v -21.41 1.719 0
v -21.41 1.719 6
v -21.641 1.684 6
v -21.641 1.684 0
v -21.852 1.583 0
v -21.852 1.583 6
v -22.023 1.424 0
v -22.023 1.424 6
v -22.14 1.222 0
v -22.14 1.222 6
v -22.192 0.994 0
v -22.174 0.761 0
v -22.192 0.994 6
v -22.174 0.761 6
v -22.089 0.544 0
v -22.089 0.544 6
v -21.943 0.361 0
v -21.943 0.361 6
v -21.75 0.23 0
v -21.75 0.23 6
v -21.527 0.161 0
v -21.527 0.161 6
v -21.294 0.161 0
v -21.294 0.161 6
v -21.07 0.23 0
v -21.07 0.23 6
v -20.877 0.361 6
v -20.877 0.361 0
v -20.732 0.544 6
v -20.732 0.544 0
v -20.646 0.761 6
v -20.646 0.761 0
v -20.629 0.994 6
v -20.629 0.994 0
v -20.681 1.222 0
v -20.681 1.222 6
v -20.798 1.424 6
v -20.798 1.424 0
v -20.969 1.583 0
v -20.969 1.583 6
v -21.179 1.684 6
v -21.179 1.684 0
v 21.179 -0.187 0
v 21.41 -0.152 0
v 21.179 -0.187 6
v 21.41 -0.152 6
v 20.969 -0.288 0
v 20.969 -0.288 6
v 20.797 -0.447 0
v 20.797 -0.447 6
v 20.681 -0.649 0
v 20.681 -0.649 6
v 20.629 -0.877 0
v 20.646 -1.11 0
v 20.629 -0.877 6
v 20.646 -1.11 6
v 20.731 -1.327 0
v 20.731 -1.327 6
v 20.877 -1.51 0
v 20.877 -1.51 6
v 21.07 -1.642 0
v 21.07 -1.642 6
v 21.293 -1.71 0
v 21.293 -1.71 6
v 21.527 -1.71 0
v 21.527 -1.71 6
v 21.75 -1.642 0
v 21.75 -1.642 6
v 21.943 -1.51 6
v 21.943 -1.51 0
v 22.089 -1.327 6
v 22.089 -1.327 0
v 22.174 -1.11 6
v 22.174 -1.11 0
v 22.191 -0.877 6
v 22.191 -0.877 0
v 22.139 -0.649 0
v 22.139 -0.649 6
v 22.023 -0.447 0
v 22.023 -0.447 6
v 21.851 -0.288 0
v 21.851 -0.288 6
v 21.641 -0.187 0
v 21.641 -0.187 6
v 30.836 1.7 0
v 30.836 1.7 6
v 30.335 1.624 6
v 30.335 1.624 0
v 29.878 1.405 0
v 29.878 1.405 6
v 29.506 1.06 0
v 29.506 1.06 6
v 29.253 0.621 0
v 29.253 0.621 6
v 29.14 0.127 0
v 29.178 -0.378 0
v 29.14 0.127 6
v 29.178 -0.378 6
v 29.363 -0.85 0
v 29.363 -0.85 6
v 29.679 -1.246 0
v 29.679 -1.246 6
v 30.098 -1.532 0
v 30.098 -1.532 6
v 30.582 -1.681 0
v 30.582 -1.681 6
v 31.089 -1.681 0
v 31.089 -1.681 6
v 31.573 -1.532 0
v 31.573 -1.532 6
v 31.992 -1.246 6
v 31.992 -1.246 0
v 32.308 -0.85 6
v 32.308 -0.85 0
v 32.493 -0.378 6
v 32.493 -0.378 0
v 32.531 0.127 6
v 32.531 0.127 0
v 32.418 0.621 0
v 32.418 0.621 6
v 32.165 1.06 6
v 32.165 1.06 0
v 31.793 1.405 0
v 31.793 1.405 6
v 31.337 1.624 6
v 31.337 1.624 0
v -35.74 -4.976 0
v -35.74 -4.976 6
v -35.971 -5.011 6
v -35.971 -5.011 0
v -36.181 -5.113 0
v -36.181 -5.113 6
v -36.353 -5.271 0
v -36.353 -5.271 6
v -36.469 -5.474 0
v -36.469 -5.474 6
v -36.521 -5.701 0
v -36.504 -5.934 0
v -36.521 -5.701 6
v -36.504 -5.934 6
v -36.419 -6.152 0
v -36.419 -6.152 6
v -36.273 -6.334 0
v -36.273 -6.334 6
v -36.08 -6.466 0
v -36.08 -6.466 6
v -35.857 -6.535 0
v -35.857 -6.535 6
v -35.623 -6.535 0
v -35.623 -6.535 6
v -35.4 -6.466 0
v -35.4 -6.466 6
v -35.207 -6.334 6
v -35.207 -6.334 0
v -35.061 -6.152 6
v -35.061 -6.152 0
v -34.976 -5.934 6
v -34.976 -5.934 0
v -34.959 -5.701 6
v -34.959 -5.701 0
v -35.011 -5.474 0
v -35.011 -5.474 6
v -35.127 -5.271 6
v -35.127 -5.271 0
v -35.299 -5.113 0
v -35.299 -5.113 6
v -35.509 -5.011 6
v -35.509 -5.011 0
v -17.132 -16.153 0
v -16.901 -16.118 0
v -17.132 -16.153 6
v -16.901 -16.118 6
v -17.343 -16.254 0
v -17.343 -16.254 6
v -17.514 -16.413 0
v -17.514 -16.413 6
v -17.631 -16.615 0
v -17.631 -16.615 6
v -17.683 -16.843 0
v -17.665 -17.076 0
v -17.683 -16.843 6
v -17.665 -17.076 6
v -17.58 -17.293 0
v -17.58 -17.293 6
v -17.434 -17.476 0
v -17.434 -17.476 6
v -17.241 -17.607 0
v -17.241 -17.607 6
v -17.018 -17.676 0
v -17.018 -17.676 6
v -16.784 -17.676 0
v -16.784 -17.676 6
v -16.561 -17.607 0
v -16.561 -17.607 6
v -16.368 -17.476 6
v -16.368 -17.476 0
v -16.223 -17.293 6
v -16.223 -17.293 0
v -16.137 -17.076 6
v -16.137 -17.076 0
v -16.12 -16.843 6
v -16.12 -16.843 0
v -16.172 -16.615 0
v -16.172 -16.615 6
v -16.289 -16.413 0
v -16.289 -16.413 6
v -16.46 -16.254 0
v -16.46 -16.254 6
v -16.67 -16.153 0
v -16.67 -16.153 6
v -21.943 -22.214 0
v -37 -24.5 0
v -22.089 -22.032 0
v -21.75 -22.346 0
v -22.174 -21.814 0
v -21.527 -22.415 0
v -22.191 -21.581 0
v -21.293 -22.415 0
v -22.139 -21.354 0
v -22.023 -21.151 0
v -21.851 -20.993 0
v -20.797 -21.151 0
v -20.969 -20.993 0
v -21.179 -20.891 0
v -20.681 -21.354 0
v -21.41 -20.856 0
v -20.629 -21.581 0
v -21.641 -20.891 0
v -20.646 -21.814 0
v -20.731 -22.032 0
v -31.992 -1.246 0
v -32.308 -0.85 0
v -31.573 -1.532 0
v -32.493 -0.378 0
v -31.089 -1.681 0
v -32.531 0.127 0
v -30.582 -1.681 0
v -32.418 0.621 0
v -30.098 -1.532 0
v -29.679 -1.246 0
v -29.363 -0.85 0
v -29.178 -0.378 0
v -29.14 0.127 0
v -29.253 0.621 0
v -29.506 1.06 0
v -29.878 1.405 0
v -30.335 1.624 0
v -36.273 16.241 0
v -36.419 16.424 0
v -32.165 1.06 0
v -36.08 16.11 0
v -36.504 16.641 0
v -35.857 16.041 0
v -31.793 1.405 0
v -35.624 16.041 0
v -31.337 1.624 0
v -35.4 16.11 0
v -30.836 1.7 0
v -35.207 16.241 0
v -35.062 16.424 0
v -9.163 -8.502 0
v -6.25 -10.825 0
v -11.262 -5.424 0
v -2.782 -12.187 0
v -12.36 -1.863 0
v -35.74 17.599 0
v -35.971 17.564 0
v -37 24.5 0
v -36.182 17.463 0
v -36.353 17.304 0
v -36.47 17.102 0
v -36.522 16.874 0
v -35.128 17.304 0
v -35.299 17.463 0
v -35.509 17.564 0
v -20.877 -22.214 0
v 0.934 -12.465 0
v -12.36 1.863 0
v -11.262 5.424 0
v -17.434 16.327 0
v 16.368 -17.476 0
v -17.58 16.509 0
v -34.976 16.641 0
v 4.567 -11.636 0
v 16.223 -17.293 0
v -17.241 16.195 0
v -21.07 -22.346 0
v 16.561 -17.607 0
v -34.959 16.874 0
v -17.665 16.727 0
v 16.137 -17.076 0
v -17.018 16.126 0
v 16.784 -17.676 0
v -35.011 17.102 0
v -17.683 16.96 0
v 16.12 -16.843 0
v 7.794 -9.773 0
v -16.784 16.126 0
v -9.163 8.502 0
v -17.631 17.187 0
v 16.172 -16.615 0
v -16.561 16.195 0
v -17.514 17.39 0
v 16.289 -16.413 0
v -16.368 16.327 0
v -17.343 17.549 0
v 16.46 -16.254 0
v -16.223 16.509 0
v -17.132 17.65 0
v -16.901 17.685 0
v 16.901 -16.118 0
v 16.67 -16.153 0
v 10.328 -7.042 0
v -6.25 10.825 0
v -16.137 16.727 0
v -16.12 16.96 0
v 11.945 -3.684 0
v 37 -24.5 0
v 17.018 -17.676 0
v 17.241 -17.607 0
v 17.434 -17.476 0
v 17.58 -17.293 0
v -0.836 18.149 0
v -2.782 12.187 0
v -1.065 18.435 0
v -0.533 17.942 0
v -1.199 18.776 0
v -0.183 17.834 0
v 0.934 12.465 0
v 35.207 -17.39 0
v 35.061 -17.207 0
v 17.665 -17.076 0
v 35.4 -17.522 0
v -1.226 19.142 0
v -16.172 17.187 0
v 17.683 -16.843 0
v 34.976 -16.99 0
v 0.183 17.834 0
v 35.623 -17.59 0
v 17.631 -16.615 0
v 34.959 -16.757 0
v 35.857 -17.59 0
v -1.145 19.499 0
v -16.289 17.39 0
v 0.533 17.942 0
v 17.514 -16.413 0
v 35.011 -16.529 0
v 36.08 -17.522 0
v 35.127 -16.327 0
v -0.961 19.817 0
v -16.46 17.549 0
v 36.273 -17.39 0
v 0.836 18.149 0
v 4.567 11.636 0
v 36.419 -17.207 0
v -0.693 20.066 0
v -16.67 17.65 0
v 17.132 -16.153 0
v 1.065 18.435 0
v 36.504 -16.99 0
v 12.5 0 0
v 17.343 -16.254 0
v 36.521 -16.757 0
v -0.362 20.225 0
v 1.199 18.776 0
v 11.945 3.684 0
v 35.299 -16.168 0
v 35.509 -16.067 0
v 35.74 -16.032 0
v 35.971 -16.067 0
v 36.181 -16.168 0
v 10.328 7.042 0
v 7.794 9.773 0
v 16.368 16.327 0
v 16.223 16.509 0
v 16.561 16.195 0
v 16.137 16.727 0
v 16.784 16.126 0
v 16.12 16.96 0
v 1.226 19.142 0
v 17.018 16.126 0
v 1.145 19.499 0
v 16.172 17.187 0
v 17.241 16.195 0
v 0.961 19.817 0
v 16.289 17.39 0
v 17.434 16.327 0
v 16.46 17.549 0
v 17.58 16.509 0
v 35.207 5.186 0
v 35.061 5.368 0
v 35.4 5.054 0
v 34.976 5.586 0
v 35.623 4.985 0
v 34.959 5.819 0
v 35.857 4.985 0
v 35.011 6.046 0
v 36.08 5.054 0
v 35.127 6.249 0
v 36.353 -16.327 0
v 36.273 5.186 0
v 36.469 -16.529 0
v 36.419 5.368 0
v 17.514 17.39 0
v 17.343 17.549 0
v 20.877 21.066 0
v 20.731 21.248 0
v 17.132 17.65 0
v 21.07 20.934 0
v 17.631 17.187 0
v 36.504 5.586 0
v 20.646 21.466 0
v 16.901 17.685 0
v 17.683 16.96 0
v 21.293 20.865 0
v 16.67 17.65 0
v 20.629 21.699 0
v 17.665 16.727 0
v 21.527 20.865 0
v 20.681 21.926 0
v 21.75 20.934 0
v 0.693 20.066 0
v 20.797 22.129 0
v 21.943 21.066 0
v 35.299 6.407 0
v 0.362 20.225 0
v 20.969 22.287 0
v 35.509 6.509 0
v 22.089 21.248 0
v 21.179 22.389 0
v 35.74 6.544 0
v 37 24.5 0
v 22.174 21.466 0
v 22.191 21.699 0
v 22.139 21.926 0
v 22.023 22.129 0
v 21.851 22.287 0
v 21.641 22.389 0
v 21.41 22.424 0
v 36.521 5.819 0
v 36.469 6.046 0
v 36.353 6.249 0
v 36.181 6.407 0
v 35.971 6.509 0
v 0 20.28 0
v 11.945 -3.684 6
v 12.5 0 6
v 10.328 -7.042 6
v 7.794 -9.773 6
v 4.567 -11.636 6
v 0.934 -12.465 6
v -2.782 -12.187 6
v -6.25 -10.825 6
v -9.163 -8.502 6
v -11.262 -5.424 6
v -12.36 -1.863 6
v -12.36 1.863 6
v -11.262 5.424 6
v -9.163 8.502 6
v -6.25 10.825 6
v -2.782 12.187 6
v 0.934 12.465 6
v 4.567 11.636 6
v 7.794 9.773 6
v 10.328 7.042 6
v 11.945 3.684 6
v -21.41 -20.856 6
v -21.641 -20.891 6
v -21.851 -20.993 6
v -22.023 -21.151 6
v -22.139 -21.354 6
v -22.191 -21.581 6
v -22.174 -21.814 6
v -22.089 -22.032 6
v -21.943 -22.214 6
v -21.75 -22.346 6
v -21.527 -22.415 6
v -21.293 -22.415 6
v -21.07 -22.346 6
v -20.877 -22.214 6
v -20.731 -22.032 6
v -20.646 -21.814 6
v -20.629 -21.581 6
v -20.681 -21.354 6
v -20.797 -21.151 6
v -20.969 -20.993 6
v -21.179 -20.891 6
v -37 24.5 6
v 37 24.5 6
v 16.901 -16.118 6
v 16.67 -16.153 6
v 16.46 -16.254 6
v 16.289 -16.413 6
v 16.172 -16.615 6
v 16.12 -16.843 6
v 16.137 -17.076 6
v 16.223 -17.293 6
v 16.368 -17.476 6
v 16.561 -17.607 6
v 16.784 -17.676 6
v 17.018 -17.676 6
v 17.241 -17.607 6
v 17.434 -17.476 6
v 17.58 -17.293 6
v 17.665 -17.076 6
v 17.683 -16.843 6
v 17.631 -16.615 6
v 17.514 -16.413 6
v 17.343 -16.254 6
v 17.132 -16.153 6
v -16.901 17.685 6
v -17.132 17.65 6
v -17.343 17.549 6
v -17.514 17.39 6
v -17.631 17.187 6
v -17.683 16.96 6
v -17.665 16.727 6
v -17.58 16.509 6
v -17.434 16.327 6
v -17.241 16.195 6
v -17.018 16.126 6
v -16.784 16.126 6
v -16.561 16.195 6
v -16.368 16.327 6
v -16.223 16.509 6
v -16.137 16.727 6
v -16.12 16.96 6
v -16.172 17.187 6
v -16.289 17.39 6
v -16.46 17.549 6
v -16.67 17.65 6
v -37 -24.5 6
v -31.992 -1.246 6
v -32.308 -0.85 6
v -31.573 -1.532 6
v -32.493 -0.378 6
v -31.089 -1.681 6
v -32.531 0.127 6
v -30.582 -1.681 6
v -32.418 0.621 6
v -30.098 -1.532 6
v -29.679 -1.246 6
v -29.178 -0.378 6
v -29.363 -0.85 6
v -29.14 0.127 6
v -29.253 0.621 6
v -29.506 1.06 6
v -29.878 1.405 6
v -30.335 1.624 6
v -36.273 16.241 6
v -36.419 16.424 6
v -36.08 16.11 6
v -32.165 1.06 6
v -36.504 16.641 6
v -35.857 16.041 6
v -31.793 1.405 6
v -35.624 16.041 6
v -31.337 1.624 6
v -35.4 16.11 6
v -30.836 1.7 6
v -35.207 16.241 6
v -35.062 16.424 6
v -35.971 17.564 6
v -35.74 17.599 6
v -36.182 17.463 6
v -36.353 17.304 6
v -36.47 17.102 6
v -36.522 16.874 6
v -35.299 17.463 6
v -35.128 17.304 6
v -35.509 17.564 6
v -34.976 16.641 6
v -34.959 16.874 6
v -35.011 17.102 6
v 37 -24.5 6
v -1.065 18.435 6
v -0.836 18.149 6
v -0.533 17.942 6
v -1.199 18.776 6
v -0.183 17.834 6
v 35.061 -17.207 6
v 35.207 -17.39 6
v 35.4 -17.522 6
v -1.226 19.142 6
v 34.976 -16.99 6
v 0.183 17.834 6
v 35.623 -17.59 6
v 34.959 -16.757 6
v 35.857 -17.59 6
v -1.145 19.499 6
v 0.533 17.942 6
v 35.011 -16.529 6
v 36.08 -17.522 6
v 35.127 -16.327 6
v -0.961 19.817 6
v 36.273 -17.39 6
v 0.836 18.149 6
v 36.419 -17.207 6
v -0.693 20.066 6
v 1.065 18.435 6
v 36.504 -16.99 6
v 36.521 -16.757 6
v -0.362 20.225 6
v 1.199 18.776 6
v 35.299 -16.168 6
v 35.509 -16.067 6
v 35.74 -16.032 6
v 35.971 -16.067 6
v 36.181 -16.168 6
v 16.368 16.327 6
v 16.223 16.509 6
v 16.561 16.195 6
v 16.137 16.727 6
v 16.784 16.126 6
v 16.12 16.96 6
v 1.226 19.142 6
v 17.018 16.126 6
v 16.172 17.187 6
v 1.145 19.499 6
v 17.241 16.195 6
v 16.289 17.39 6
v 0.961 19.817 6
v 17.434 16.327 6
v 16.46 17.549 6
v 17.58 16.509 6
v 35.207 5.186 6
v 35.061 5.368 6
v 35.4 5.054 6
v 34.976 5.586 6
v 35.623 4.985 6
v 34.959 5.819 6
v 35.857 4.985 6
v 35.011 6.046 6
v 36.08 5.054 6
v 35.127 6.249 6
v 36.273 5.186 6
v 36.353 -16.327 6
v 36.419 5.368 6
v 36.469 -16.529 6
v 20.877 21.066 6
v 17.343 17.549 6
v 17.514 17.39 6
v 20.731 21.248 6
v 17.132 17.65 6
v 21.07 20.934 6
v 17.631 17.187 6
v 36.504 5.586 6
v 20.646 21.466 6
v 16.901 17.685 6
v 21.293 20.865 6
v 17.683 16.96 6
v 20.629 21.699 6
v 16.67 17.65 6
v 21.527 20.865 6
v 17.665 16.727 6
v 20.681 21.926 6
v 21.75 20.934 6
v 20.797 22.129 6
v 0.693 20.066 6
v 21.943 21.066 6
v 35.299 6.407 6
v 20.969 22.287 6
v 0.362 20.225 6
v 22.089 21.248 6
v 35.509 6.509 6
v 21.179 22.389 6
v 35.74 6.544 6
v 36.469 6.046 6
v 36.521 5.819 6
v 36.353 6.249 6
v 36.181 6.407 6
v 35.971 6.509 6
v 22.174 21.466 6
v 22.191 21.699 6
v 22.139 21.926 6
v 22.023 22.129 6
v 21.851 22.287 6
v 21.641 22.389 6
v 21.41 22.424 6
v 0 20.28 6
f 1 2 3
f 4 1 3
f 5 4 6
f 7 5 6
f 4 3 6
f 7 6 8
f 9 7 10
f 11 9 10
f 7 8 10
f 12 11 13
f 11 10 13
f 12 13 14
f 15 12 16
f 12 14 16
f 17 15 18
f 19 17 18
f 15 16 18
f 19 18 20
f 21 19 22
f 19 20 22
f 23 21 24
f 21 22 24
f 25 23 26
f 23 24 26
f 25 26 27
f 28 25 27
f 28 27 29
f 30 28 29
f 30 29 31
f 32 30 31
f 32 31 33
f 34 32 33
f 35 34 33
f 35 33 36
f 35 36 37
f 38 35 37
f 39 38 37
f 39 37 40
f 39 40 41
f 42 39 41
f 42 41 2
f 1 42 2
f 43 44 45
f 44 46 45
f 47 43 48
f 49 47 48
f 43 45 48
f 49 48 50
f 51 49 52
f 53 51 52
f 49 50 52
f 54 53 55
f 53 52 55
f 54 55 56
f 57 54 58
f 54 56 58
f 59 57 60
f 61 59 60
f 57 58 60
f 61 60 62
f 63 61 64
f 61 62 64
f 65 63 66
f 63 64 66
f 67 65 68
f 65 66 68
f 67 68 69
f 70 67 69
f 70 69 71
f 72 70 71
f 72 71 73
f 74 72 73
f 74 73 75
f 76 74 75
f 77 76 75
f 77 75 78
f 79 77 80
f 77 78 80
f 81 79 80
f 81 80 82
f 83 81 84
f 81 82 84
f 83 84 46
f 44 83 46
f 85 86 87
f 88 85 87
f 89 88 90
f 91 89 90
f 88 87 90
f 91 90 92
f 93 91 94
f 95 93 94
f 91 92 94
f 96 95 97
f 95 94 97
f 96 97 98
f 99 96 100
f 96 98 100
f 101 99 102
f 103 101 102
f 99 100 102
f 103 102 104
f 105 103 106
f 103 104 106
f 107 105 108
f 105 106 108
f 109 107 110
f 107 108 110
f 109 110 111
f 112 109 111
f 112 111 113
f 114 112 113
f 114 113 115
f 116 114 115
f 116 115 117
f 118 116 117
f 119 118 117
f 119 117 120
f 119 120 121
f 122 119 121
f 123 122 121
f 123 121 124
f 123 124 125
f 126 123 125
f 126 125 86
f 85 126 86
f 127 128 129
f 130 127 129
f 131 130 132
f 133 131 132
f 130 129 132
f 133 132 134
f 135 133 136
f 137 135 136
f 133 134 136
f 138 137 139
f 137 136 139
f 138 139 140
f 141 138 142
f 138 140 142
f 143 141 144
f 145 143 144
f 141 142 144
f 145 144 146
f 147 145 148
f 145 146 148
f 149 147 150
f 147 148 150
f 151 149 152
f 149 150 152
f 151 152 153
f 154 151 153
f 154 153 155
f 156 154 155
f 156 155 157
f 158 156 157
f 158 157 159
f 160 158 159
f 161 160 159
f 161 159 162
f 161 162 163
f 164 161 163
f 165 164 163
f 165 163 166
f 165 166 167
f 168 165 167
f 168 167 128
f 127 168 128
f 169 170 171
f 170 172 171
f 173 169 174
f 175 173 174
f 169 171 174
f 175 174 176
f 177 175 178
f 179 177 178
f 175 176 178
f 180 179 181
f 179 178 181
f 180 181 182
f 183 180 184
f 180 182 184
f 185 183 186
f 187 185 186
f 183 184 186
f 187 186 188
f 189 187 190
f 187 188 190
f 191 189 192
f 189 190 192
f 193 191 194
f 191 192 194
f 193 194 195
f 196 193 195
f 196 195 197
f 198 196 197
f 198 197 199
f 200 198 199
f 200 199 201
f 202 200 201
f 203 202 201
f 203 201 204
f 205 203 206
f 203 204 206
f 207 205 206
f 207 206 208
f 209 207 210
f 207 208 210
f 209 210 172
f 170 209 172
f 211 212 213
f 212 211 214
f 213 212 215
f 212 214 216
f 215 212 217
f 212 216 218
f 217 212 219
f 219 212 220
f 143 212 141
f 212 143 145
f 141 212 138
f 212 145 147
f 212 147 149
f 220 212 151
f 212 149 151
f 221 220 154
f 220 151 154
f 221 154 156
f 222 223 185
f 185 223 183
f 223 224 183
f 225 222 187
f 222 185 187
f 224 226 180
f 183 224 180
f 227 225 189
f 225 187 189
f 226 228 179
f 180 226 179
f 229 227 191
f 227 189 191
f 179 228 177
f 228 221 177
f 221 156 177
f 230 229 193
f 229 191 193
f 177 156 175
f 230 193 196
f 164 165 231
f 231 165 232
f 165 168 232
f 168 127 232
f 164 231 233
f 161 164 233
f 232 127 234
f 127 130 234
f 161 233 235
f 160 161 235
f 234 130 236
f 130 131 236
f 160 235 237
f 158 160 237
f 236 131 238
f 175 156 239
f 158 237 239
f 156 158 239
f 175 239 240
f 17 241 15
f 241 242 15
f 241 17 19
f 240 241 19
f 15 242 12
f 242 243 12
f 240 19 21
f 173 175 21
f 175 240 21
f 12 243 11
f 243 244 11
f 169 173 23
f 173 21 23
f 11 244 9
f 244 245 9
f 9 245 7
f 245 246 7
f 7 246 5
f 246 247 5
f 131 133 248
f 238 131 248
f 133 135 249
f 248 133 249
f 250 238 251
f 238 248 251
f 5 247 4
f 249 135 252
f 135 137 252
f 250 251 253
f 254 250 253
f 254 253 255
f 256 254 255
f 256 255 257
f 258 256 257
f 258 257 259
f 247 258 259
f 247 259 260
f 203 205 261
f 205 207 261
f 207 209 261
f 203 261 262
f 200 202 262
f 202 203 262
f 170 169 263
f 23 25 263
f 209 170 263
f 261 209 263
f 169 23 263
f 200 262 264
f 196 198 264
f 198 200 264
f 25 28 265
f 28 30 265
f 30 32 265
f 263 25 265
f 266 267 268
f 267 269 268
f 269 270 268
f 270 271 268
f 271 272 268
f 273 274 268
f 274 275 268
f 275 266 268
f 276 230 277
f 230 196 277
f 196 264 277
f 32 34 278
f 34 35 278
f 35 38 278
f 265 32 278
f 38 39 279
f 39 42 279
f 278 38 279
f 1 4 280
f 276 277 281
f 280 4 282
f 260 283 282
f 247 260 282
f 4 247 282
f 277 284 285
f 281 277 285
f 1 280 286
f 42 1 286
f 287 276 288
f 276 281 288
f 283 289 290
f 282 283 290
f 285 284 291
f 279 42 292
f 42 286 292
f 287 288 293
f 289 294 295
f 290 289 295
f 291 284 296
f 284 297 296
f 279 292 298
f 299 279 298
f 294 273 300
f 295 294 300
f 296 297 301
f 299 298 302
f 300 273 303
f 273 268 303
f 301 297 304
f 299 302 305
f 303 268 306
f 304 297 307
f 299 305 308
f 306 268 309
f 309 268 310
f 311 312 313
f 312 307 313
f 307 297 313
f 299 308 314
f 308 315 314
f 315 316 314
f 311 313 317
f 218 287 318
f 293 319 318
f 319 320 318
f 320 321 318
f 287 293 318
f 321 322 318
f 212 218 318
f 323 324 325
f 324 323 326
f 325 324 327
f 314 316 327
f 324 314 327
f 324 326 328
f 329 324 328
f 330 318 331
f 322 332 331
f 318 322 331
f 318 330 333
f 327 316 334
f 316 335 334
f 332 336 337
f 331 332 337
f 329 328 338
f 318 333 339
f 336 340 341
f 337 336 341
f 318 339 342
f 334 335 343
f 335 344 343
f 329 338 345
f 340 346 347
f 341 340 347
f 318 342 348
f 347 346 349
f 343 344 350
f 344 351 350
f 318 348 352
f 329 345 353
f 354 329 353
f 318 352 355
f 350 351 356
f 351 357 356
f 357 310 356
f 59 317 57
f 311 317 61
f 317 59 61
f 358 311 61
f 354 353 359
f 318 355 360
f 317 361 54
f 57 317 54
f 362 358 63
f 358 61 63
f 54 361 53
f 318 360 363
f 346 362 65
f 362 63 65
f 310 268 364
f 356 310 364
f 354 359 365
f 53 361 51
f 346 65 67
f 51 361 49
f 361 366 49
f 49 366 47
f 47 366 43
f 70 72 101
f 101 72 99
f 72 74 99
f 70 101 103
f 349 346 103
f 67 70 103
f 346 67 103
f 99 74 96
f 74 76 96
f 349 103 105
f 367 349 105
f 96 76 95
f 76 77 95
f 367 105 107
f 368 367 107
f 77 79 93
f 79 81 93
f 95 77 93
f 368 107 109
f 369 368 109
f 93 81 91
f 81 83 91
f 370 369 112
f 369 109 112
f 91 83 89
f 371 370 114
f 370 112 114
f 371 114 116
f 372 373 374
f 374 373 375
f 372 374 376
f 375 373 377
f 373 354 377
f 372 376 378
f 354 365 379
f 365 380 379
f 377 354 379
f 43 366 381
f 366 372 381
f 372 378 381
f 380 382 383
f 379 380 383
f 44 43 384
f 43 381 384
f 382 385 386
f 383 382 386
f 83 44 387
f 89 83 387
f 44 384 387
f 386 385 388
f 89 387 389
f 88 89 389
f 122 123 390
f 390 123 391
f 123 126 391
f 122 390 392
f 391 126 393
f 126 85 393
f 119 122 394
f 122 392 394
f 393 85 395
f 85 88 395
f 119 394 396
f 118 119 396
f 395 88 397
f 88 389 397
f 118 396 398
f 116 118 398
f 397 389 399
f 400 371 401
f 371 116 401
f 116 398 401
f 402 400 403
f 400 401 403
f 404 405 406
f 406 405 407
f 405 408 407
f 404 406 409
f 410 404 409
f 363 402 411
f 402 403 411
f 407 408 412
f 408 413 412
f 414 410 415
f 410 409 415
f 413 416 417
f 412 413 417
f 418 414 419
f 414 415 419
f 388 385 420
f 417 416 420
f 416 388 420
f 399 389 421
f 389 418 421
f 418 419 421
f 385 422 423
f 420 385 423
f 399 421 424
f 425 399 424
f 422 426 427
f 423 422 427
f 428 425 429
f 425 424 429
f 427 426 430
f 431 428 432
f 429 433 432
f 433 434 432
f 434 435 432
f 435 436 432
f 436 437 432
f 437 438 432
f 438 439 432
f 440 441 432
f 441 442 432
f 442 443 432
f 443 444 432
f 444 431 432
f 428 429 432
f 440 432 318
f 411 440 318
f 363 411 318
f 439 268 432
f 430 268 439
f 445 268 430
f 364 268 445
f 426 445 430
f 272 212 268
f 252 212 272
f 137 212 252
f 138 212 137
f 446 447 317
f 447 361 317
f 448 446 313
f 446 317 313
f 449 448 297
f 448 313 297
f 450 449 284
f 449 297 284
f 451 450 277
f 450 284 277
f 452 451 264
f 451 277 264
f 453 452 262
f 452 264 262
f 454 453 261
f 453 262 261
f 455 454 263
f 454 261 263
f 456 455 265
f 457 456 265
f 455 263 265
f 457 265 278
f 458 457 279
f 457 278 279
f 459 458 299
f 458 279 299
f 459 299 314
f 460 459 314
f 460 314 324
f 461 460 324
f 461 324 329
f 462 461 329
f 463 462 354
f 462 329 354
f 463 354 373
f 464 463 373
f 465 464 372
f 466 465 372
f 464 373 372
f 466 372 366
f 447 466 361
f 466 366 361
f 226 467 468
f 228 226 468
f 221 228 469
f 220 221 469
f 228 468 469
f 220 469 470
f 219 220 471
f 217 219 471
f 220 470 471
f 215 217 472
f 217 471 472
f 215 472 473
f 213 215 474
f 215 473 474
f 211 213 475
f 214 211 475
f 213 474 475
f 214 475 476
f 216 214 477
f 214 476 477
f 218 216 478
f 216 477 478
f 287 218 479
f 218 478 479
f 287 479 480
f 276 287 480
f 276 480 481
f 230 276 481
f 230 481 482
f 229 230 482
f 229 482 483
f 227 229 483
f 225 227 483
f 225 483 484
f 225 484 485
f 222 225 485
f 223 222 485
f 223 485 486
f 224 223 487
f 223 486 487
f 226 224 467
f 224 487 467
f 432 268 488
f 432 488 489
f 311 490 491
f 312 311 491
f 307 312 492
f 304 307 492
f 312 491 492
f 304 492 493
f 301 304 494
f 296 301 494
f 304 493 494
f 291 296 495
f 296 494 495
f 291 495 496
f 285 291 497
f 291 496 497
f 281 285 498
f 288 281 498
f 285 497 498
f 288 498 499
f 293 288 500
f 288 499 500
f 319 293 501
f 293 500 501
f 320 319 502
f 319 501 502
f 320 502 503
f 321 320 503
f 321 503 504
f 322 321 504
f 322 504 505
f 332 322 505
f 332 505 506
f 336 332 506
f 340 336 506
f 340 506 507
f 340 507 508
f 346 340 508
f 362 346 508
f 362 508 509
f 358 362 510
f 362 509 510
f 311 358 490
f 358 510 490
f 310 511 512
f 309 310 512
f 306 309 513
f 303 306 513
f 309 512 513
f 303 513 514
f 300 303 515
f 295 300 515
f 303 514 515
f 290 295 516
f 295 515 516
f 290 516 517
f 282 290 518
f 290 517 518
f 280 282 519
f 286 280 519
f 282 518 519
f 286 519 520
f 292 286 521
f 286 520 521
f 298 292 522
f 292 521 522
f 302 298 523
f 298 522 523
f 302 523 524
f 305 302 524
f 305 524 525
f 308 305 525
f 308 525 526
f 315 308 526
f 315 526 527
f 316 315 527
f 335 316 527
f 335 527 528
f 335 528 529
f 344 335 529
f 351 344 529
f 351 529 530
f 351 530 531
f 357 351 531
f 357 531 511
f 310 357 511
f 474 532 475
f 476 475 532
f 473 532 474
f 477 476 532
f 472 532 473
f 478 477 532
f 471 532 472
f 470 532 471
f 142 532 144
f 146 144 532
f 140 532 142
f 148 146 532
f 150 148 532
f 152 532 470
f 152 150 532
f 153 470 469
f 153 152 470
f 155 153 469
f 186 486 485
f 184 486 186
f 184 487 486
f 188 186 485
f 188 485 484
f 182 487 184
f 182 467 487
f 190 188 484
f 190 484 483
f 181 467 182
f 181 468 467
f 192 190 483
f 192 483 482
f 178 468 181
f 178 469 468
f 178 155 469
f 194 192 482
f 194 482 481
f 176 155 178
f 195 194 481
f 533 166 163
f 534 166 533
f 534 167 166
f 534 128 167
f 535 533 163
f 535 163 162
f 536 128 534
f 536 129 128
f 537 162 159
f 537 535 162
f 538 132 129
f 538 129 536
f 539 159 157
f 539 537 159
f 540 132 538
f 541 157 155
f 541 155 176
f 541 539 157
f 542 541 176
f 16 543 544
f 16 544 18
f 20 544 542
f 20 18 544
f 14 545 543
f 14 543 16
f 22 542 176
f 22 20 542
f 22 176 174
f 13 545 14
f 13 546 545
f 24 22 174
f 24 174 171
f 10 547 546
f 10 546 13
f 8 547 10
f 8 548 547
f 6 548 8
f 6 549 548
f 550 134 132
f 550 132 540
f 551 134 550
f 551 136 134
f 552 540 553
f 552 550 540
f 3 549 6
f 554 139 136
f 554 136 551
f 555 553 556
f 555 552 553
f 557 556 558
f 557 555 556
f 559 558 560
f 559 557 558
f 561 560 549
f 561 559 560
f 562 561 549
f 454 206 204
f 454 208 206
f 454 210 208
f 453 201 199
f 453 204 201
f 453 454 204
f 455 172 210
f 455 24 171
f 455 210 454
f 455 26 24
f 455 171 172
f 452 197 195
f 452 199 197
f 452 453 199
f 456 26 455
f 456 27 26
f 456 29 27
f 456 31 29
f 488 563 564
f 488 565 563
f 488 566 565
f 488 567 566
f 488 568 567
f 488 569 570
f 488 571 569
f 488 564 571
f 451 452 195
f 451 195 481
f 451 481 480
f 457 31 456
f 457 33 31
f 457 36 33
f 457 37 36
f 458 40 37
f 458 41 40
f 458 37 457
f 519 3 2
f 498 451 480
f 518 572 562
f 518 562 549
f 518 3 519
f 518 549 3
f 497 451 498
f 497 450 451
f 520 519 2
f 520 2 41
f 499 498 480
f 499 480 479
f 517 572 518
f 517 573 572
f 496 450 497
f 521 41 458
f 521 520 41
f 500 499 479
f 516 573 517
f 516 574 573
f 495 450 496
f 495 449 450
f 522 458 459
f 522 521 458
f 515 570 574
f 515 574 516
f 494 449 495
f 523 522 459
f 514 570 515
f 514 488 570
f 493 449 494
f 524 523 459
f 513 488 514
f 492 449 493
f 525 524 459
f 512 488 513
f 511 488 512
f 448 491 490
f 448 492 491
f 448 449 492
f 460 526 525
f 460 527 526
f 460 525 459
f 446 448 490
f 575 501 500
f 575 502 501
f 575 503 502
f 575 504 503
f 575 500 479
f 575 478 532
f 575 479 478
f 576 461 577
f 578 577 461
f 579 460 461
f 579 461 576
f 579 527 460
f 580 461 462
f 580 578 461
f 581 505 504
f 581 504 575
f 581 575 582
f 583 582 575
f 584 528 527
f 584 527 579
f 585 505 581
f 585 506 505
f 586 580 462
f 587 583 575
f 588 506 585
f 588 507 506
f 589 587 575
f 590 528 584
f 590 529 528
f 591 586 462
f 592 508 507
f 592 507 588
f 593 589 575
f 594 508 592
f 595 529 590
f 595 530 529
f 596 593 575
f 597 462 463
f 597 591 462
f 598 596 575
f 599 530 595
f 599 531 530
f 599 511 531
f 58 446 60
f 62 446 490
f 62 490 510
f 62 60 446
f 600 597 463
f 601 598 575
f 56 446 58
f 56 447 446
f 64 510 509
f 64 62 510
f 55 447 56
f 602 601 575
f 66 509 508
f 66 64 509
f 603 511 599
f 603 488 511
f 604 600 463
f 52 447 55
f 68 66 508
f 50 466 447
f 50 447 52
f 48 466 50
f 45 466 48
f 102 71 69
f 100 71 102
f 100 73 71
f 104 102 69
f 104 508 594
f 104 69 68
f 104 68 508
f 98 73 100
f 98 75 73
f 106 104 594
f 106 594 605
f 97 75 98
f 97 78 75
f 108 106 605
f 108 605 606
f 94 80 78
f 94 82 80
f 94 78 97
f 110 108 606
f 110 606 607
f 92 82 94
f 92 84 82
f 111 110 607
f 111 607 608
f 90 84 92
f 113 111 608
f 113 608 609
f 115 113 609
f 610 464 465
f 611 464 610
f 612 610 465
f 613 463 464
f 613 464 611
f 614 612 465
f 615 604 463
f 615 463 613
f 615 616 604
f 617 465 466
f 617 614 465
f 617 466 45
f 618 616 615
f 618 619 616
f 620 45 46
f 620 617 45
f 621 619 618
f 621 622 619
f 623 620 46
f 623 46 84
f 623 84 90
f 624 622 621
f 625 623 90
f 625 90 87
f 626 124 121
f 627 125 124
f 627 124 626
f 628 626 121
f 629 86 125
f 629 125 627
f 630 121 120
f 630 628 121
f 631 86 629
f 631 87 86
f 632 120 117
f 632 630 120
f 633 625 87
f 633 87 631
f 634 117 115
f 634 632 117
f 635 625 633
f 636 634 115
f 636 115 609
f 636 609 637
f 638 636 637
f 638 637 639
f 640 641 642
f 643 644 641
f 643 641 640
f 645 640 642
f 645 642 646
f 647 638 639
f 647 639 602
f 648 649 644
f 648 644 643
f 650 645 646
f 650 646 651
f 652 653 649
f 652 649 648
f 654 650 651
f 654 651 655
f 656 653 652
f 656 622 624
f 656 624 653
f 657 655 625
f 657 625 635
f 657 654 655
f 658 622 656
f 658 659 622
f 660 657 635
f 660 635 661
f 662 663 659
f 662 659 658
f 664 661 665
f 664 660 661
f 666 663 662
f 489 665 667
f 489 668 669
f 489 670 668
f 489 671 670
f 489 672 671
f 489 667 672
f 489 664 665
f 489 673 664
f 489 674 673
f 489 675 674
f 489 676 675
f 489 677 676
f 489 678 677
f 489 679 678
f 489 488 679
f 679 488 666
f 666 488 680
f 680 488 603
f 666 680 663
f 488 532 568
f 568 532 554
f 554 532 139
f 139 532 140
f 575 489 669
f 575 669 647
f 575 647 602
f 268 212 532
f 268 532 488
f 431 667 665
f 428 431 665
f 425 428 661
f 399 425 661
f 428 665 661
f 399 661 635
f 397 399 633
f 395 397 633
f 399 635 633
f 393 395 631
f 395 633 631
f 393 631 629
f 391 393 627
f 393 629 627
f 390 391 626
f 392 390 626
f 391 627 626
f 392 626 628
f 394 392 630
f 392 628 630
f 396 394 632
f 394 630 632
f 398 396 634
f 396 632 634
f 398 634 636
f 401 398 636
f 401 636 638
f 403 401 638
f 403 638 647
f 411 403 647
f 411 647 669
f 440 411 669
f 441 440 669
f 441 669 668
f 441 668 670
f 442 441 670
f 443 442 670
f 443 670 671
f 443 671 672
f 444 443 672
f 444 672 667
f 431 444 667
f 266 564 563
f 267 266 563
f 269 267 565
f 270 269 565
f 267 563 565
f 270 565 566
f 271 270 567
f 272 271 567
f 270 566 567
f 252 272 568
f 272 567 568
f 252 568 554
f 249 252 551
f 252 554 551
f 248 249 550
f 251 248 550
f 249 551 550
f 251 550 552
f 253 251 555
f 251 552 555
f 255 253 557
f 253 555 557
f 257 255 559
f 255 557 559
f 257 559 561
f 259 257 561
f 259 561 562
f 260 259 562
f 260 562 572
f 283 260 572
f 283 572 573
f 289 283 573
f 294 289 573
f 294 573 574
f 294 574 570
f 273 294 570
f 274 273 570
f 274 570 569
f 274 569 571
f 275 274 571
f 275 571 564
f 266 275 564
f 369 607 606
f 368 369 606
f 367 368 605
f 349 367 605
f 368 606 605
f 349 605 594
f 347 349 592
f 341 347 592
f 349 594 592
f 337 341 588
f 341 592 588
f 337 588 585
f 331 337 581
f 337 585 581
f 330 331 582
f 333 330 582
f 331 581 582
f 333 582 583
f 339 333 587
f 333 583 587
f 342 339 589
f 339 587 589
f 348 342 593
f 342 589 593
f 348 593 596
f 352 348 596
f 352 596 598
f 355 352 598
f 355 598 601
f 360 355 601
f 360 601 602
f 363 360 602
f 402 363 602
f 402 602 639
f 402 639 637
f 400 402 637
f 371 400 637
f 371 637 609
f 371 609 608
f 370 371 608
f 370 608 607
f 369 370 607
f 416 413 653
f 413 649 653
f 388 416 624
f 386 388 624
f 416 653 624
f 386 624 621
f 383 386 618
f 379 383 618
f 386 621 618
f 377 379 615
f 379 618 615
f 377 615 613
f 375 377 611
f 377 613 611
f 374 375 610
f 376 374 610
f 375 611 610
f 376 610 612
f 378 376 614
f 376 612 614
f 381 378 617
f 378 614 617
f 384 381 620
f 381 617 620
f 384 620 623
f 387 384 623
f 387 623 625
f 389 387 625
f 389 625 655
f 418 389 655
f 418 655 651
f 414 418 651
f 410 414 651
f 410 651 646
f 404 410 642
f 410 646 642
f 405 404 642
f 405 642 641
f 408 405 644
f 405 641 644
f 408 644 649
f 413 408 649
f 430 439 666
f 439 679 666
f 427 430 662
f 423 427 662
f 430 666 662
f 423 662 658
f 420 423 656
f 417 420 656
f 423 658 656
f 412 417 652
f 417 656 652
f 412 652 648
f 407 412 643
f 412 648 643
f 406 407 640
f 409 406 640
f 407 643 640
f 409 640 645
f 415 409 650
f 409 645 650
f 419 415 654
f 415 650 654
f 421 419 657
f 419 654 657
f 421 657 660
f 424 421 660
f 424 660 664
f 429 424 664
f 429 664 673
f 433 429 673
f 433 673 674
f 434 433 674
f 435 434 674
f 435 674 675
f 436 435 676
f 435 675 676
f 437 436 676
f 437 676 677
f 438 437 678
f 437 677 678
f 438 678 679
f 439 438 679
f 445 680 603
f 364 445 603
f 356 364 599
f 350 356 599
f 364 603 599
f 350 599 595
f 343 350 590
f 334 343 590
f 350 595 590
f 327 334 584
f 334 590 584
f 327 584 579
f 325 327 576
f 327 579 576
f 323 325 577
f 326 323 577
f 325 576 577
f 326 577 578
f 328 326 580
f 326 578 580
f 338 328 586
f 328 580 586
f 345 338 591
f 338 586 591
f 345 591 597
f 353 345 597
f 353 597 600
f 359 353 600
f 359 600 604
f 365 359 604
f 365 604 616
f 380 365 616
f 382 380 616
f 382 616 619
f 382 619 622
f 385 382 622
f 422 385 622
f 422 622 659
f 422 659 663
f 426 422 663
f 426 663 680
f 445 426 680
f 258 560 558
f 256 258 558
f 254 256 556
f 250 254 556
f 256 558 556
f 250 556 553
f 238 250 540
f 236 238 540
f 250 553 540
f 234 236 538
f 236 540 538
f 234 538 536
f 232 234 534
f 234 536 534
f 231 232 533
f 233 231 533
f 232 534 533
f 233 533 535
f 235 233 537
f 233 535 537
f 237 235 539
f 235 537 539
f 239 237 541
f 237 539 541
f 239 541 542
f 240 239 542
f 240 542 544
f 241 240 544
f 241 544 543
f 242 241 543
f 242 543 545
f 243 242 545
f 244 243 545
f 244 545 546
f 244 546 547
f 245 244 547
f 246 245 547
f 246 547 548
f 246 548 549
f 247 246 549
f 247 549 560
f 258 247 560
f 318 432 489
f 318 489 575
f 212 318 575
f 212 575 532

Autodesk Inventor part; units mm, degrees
ref_plane "YZ Plane" through (0, 0, 0) normal (1, 0, 0) x (0, 1, 0)
ref_plane "XZ Plane" through (0, 0, 0) normal (0, 1, 0) x (-1, 0, 0)
ref_plane "XY Plane" through (0, 0, 0) normal (0, 0, 1) x (1, 0, 0)
sketch "Sketch1" plane through (0, 0, 0) normal (0, 0, 1) x (1, 0, 0)
  line L0 (37, -24.5) -> (-37, -24.5)
  line L1 (-37, -24.5) -> (-37, 24.5)
  line L2 (-37, 24.5) -> (37, 24.5)
  line L3 (37, 24.5) -> (37, -24.5)
  line L4 (37, -24.5) -> (-37, 24.5) construction
  line L5 (-37, -24.5) -> (37, 24.5) construction
  circle A0 centre (0, 0) radius 12.5
  line L6 (-19.05, 19.05) -> (19.05, 19.05)
  line L7 (19.05, 19.05) -> (19.05, -19.05)
  line L8 (19.05, -19.05) -> (-19.05, -19.05)
  line L9 (-19.05, -19.05) -> (-19.05, 19.05)
  line L10 (-19.05, 19.05) -> (19.05, -19.05) construction
  line L11 (19.05, 19.05) -> (-19.05, -19.05) construction
  line L12 (19.05, 19.05) -> (16.9012, 19.05)
  line L13 (16.9012, 19.05) -> (16.9012, 16.9012)
  line L14 (16.9012, 16.9012) -> (19.05, 16.9012)
  line L15 (19.05, 16.9012) -> (19.05, 19.05)
  line L16 (0, 19.05) -> (0, -19.05)
  line L17 (-19.05, 0) -> (19.05, 0)
  line L18 (-16.9012, 19.05) -> (-16.9012, 16.9012)
  line L19 (-16.9012, 16.9012) -> (-19.05, 16.9012)
  line L20 (19.05, 0) -> (-19.05, 0)
  line L21 (16.9012, -19.05) -> (16.9012, -16.9012)
  line L22 (16.9012, -16.9012) -> (19.05, -16.9012)
  line L23 (-16.9012, -16.9012) -> (-19.05, -16.9012)
  line L24 (-16.9012, -19.05) -> (-16.9012, -16.9012)
  line L25 (19.05, 0) -> (30.8356, 0)
  line L26 (-19.05, 0) -> (-30.8356, 0)
  circle A1 centre (-16.9012, 16.9012) radius 2
  circle A2 centre (16.9012, 16.9012) radius 2
  circle A3 centre (16.9012, -16.9012) radius 2
  circle A4 centre (-16.9012, -16.9012) radius 2
  circle A5 centre (-30.8356, 0) radius 2.85
  circle A6 centre (30.8356, 0) radius 2.85
  line L27 (-30.8356, 14.9012) -> (-30.8356, 2.85)
  line L28 (-38.1003, 8.8756) -> (-19.0503, 8.8756)
  line L29 (-22.8548, 8.8756) -> (-20.3098, 8.8756)
  line L30 (-21.4103, 8.8756) -> (-21.4103, 0.9356)
  line L31 (-38.1719, 10.7443) -> (-35.8119, 10.7443)
  line L32 (-35.7403, 8.8756) -> (-35.7403, 16.8156)
  line L33 (-38.1719, 16.29) -> (-38.1719, 13.7)
  line L34 (-35.7403, 14.2256) -> (-19.0503, 14.2256)
  line L35 (-19.0503, 14.2256) -> (-19.0503, 8.8756)
  line L36 (-25.2148, 0.9356) -> (-25.2148, 3.5256)
  line L37 (-21.4103, 3.5256) -> (-38.1003, 3.5256)
  line L38 (-38.1003, 14.2256) -> (-35.7403, 14.2256)
  line L39 (-21.4103, 3.5256) -> (-19.0503, 3.5256)
  line L40 (-19.0503, 3.5256) -> (-19.0503, 8.8756)
  line L41 (-35.8119, 14.2256) -> (-35.8119, 19.0506)
  line L42 (-38.1003, 19.0506) -> (-33.3803, 19.0506)
  line L43 (-33.3803, 19.0506) -> (-33.3803, 14.2256)
  line L44 (-19.0503, 3.5256) -> (-19.0503, -1.2994)
  line L45 (-19.0503, -1.2994) -> (-23.7703, -1.2994)
  line L46 (-23.7703, -1.2994) -> (-23.7703, 3.5256)
  circle A7 centre (-35.7403, 16.8156) radius 1.195
  circle A8 centre (-21.4103, 0.9356) radius 1.195
  line L47 (30.8356, -2.85) -> (30.8356, -14.9012)
  line L48 (33.9356, -8.8756) -> (40.1, -8.8756)
  line L49 (19.05, -8.8756) -> (38.1, -8.8756)
  line L50 (35.74, -8.8756) -> (35.74, -16.8156)
  line L51 (21.41, -8.8756) -> (21.41, -0.9356)
  line L52 (21.41, -3.5256) -> (38.1, -3.5256)
  line L53 (38.1, -3.5256) -> (38.1, -8.8756)
  line L54 (35.74, -14.2256) -> (19.05, -14.2256)
  line L55 (19.05, -3.5256) -> (21.41, -3.5256)
  line L56 (30.8356, -14.2256) -> (33.1956, -14.2256)
  line L57 (38.1, -14.2256) -> (38.1, -8.8756)
  line L58 (19.05, 1.2994) -> (23.77, 1.2994)
  line L59 (23.77, 1.2994) -> (23.77, -3.5256)
  line L60 (38.1, -14.2256) -> (38.1, -19.0506)
  line L61 (38.1, -19.0506) -> (33.38, -19.0506)
  line L62 (33.38, -19.0506) -> (33.38, -14.2256)
  circle A9 centre (21.41, -0.9356) radius 1.195
  circle A10 centre (35.74, -16.8156) radius 1.195
  line L63 (-38.1, -13.7) -> (-19.05, -13.7)
  line L64 (-21.41, -13.7) -> (-21.41, -21.64)
  line L65 (-35.74, -13.7) -> (-35.74, -5.76)
  line L66 (-35.74, -8.35) -> (-19.05, -8.35)
  line L67 (-19.05, -7.985) -> (-19.05, -13.335)
  line L68 (-21.41, -19.05) -> (-38.1, -19.05)
  line L69 (-38.1, -8.35) -> (-35.74, -8.35)
  line L70 (-21.41, -19.05) -> (-19.05, -19.05)
  line L71 (-19.05, -18.685) -> (-19.05, -13.335)
  line L72 (-38.1, -3.525) -> (-33.38, -3.525)
  line L73 (-33.38, -3.525) -> (-33.38, -8.35)
  line L74 (-19.05, -19.05) -> (-19.05, -23.875)
  line L75 (-19.05, -23.875) -> (-23.77, -23.875)
  line L76 (-23.77, -23.875) -> (-23.77, -19.05)
  circle A11 centre (-35.74, -5.76) radius 1.195
  circle A12 centre (-21.41, -21.64) radius 1.195
  line L77 (19.05, 13.7) -> (38.1, 13.7)
  line L78 (35.74, 13.7) -> (35.74, 5.76)
  line L79 (21.41, 13.7) -> (21.41, 21.64)
  line L80 (21.41, 19.05) -> (38.1, 19.05)
  line L81 (38.1, 19.05) -> (38.1, 13.7)
  line L82 (35.74, 8.35) -> (19.05, 8.35)
  line L83 (19.05, 19.05) -> (21.41, 19.05)
  line L84 (35.74, 8.35) -> (38.1, 8.35)
  line L85 (38.1, 8.35) -> (38.1, 13.7)
  line L86 (19.05, 23.875) -> (23.77, 23.875)
  line L87 (23.77, 23.875) -> (23.77, 19.05)
  line L88 (38.1, 8.35) -> (38.1, 3.525)
  line L89 (38.1, 3.525) -> (33.38, 3.525)
  line L90 (33.38, 3.525) -> (33.38, 8.35)
  circle A13 centre (21.41, 21.64) radius 1.195
  circle A14 centre (35.74, 5.76) radius 1.195
  arc A15 (-37, 21.2315) -> (-36.9905, 20.9193) centre (-31.8628, 21.2315) ccw
  line L91 (-38.1, -3.525) -> (-38.1, -19.05)
  line L92 (19.05, 1.2994) -> (19.05, -14.2256)
  circle A16 centre (0, 19.05) radius 2.84
  dimension "d29" = 5.7
  dimension "d0" = 74
  dimension "d1" = 49
  dimension "d2" = 25
  dimension "d3" = 38.1
  dimension "d4" = 38.1
  dimension "d5" = 2.1488
  dimension "d6" = 2.1488
  dimension "d7" = 11.7856
  dimension "d24" = 4
  dimension "d25" = 4
  dimension "d26" = 4
  dimension "d27" = 4
  dimension "d28" = 5.7
  dimension "d30" = 19.05
  dimension "d31" = 2.545
  dimension "d32" = 7.94
  dimension "d33" = 2.36
  dimension "d34" = 7.94
  dimension "d35" = 2.59
  dimension "d36" = 2.59
  dimension "d37" = 4.825
  dimension "d39" = 4.825
  dimension "d40" = 4.72
  dimension "d41" = 2.39
  dimension "d42" = 2.39
  dimension "d43" = 19.05
  dimension "d44" = 2.36
  dimension "d45" = 7.94
  dimension "d46" = 2.36
  dimension "d47" = 7.94
  dimension "d48" = 2.59
  dimension "d49" = 2.59
  dimension "d50" = 4.825
  dimension "d51" = 4.72
  dimension "d52" = 4.825
  dimension "d53" = 4.72
  dimension "d54" = 2.39
  dimension "d55" = 2.39
  dimension "d56" = 19.05
  dimension "d57" = 2.36
  dimension "d58" = 7.94
  dimension "d59" = 2.36
  dimension "d60" = 7.94
  dimension "d61" = 2.59
  dimension "d62" = 2.59
  dimension "d63" = 4.825
  dimension "d64" = 4.72
  dimension "d65" = 4.825
  dimension "d66" = 4.72
  dimension "d67" = 2.39
  dimension "d68" = 2.39
  dimension "d69" = 19.05
  dimension "d70" = 2.36
  dimension "d71" = 7.94
  dimension "d72" = 2.36
  dimension "d73" = 7.94
  dimension "d74" = 2.59
  dimension "d75" = 2.59
  dimension "d76" = 4.825
  dimension "d77" = 4.72
  dimension "d78" = 4.825
  dimension "d79" = 4.72
  dimension "d80" = 2.39
  dimension "d81" = 2.39
extrude "Extrusion1" add sketch "Sketch1" along normal blind 6 contours L0 L1 L68 L76 L75 L74 L8 L7 L54 L62 L61 L3 | A10 | L61 L62 L54 L50 L48 L3 | L1 L63 L64 L68 | L48 L49 L47 L52 L3 | L1 L69 L65 L63 | A12 | L68 L70 L74 L75 L76 | L52 L47 A6 L25 L59 L58 L7 L82 L90 L89 L3 | L50 L54 L47 L49 L48 | A11 | L1 L72 L73 L66 L69 | L65 L66 L9 L63 | L64 L63 L9 L70 | A14 | L89 L90 L82 L84 L3 | L52 L59 L25 A6 L47 | L47 L49 L51 L52 | L1 L37 L27 A5 L26 L46 L45 L9 L66 L73 L72 | L9 L23 A4 L24 L8 | L84 L78 L77 L3 | A6 | L47 L54 L7 L49 | L52 L51 A9 L25 L59 | L1 L28 L27 L37 | L9 L17 A0 L16 L8 L24 A4 L23 | L77 L79 L80 L3 | L82 L7 L77 L78 | L49 L7 L55 L51 | L55 L7 L25 A9 L51 | L25 A9 L7 L58 L59 | L7 L22 A3 L21 L8 L16 A0 L17 | L1 L38 L32 L28 | L37 L46 L26 A5 L27 | L27 L28 L30 L37 | A4 L23 L24 | L24 L23 A4 | A13 | L80 L83 L6 A16 L9 L34 L43 L42 L1 L2 L3 | L7 L17 A0 L16 A16 L6 L13 A2 L14 | A9 L25 | L25 A9 | L7 L8 L21 A3 L22 | L32 L34 L27 L28 | L27 L34 L9 L28 | A5 | L77 L7 L83 L79 | A3 L21 L22 | L22 L21 A3 | L1 L42 L41 A7 L38 | L38 L41 A7 L32 | L32 A7 L41 L42 L43 L34 | L37 L30 A8 L26 L46 | L45 L46 L26 A8 L9 | L17 L9 L19 A1 L18 L6 A16 L16 A0 | L14 A2 L13 L6 L7 | A7 L41 | L28 L9 L39 L30 | L39 L9 L26 A8 L30 | A2 L13 L14 | L14 L13 A2 | A7 L41 | L9 L6 L18 A1 L19 | A8 L26 | L26 A8 | A16 L6 L16 | L16 L6 A16 | A1 L18 L19 | L19 L18 A1 | L6 A16
hole "Hole1" at (-16.9012, -16.9012, 0) at (16.9012, -16.9012, 0) at (16.9012, 16.9012, 0) at (-16.9012, 16.9012, 0) direction (0, 0, 1) diameter 1.567 end through all thread size "M2x0.4" class "6H" standard "ISO Metric profile"
hole "Hole2" at (-30.8356, 0, 0) at (30.8356, 0, 0) direction (0, 0, 1) diameter 3.4 end through all clearance for "Socket Head Cap Screw" size "M3" standard "Ansi Metric M Profile"
hole "Hole3" at (-35.7403, 16.8156, 0) at (-21.4103, 0.9356, 0) at (-35.74, -5.76, 0) at (-21.41, -21.64, 0) at (35.74, -16.8156, 0) at (21.41, -0.9356, 0) at (35.74, 5.76, 0) at (21.41, 21.64, 0) direction (0, 0, 1) diameter 1.567 end through all thread size "M2x0.4" class "6H" standard "ISO Metric profile"
hole "Hole4" at (0, 19.05, 0) direction (0, 0, 1) diameter 2.459 end through all thread size "M3x0.5" class "6H" standard "ISO Metric profile"
properties part number "adapter-plate"
